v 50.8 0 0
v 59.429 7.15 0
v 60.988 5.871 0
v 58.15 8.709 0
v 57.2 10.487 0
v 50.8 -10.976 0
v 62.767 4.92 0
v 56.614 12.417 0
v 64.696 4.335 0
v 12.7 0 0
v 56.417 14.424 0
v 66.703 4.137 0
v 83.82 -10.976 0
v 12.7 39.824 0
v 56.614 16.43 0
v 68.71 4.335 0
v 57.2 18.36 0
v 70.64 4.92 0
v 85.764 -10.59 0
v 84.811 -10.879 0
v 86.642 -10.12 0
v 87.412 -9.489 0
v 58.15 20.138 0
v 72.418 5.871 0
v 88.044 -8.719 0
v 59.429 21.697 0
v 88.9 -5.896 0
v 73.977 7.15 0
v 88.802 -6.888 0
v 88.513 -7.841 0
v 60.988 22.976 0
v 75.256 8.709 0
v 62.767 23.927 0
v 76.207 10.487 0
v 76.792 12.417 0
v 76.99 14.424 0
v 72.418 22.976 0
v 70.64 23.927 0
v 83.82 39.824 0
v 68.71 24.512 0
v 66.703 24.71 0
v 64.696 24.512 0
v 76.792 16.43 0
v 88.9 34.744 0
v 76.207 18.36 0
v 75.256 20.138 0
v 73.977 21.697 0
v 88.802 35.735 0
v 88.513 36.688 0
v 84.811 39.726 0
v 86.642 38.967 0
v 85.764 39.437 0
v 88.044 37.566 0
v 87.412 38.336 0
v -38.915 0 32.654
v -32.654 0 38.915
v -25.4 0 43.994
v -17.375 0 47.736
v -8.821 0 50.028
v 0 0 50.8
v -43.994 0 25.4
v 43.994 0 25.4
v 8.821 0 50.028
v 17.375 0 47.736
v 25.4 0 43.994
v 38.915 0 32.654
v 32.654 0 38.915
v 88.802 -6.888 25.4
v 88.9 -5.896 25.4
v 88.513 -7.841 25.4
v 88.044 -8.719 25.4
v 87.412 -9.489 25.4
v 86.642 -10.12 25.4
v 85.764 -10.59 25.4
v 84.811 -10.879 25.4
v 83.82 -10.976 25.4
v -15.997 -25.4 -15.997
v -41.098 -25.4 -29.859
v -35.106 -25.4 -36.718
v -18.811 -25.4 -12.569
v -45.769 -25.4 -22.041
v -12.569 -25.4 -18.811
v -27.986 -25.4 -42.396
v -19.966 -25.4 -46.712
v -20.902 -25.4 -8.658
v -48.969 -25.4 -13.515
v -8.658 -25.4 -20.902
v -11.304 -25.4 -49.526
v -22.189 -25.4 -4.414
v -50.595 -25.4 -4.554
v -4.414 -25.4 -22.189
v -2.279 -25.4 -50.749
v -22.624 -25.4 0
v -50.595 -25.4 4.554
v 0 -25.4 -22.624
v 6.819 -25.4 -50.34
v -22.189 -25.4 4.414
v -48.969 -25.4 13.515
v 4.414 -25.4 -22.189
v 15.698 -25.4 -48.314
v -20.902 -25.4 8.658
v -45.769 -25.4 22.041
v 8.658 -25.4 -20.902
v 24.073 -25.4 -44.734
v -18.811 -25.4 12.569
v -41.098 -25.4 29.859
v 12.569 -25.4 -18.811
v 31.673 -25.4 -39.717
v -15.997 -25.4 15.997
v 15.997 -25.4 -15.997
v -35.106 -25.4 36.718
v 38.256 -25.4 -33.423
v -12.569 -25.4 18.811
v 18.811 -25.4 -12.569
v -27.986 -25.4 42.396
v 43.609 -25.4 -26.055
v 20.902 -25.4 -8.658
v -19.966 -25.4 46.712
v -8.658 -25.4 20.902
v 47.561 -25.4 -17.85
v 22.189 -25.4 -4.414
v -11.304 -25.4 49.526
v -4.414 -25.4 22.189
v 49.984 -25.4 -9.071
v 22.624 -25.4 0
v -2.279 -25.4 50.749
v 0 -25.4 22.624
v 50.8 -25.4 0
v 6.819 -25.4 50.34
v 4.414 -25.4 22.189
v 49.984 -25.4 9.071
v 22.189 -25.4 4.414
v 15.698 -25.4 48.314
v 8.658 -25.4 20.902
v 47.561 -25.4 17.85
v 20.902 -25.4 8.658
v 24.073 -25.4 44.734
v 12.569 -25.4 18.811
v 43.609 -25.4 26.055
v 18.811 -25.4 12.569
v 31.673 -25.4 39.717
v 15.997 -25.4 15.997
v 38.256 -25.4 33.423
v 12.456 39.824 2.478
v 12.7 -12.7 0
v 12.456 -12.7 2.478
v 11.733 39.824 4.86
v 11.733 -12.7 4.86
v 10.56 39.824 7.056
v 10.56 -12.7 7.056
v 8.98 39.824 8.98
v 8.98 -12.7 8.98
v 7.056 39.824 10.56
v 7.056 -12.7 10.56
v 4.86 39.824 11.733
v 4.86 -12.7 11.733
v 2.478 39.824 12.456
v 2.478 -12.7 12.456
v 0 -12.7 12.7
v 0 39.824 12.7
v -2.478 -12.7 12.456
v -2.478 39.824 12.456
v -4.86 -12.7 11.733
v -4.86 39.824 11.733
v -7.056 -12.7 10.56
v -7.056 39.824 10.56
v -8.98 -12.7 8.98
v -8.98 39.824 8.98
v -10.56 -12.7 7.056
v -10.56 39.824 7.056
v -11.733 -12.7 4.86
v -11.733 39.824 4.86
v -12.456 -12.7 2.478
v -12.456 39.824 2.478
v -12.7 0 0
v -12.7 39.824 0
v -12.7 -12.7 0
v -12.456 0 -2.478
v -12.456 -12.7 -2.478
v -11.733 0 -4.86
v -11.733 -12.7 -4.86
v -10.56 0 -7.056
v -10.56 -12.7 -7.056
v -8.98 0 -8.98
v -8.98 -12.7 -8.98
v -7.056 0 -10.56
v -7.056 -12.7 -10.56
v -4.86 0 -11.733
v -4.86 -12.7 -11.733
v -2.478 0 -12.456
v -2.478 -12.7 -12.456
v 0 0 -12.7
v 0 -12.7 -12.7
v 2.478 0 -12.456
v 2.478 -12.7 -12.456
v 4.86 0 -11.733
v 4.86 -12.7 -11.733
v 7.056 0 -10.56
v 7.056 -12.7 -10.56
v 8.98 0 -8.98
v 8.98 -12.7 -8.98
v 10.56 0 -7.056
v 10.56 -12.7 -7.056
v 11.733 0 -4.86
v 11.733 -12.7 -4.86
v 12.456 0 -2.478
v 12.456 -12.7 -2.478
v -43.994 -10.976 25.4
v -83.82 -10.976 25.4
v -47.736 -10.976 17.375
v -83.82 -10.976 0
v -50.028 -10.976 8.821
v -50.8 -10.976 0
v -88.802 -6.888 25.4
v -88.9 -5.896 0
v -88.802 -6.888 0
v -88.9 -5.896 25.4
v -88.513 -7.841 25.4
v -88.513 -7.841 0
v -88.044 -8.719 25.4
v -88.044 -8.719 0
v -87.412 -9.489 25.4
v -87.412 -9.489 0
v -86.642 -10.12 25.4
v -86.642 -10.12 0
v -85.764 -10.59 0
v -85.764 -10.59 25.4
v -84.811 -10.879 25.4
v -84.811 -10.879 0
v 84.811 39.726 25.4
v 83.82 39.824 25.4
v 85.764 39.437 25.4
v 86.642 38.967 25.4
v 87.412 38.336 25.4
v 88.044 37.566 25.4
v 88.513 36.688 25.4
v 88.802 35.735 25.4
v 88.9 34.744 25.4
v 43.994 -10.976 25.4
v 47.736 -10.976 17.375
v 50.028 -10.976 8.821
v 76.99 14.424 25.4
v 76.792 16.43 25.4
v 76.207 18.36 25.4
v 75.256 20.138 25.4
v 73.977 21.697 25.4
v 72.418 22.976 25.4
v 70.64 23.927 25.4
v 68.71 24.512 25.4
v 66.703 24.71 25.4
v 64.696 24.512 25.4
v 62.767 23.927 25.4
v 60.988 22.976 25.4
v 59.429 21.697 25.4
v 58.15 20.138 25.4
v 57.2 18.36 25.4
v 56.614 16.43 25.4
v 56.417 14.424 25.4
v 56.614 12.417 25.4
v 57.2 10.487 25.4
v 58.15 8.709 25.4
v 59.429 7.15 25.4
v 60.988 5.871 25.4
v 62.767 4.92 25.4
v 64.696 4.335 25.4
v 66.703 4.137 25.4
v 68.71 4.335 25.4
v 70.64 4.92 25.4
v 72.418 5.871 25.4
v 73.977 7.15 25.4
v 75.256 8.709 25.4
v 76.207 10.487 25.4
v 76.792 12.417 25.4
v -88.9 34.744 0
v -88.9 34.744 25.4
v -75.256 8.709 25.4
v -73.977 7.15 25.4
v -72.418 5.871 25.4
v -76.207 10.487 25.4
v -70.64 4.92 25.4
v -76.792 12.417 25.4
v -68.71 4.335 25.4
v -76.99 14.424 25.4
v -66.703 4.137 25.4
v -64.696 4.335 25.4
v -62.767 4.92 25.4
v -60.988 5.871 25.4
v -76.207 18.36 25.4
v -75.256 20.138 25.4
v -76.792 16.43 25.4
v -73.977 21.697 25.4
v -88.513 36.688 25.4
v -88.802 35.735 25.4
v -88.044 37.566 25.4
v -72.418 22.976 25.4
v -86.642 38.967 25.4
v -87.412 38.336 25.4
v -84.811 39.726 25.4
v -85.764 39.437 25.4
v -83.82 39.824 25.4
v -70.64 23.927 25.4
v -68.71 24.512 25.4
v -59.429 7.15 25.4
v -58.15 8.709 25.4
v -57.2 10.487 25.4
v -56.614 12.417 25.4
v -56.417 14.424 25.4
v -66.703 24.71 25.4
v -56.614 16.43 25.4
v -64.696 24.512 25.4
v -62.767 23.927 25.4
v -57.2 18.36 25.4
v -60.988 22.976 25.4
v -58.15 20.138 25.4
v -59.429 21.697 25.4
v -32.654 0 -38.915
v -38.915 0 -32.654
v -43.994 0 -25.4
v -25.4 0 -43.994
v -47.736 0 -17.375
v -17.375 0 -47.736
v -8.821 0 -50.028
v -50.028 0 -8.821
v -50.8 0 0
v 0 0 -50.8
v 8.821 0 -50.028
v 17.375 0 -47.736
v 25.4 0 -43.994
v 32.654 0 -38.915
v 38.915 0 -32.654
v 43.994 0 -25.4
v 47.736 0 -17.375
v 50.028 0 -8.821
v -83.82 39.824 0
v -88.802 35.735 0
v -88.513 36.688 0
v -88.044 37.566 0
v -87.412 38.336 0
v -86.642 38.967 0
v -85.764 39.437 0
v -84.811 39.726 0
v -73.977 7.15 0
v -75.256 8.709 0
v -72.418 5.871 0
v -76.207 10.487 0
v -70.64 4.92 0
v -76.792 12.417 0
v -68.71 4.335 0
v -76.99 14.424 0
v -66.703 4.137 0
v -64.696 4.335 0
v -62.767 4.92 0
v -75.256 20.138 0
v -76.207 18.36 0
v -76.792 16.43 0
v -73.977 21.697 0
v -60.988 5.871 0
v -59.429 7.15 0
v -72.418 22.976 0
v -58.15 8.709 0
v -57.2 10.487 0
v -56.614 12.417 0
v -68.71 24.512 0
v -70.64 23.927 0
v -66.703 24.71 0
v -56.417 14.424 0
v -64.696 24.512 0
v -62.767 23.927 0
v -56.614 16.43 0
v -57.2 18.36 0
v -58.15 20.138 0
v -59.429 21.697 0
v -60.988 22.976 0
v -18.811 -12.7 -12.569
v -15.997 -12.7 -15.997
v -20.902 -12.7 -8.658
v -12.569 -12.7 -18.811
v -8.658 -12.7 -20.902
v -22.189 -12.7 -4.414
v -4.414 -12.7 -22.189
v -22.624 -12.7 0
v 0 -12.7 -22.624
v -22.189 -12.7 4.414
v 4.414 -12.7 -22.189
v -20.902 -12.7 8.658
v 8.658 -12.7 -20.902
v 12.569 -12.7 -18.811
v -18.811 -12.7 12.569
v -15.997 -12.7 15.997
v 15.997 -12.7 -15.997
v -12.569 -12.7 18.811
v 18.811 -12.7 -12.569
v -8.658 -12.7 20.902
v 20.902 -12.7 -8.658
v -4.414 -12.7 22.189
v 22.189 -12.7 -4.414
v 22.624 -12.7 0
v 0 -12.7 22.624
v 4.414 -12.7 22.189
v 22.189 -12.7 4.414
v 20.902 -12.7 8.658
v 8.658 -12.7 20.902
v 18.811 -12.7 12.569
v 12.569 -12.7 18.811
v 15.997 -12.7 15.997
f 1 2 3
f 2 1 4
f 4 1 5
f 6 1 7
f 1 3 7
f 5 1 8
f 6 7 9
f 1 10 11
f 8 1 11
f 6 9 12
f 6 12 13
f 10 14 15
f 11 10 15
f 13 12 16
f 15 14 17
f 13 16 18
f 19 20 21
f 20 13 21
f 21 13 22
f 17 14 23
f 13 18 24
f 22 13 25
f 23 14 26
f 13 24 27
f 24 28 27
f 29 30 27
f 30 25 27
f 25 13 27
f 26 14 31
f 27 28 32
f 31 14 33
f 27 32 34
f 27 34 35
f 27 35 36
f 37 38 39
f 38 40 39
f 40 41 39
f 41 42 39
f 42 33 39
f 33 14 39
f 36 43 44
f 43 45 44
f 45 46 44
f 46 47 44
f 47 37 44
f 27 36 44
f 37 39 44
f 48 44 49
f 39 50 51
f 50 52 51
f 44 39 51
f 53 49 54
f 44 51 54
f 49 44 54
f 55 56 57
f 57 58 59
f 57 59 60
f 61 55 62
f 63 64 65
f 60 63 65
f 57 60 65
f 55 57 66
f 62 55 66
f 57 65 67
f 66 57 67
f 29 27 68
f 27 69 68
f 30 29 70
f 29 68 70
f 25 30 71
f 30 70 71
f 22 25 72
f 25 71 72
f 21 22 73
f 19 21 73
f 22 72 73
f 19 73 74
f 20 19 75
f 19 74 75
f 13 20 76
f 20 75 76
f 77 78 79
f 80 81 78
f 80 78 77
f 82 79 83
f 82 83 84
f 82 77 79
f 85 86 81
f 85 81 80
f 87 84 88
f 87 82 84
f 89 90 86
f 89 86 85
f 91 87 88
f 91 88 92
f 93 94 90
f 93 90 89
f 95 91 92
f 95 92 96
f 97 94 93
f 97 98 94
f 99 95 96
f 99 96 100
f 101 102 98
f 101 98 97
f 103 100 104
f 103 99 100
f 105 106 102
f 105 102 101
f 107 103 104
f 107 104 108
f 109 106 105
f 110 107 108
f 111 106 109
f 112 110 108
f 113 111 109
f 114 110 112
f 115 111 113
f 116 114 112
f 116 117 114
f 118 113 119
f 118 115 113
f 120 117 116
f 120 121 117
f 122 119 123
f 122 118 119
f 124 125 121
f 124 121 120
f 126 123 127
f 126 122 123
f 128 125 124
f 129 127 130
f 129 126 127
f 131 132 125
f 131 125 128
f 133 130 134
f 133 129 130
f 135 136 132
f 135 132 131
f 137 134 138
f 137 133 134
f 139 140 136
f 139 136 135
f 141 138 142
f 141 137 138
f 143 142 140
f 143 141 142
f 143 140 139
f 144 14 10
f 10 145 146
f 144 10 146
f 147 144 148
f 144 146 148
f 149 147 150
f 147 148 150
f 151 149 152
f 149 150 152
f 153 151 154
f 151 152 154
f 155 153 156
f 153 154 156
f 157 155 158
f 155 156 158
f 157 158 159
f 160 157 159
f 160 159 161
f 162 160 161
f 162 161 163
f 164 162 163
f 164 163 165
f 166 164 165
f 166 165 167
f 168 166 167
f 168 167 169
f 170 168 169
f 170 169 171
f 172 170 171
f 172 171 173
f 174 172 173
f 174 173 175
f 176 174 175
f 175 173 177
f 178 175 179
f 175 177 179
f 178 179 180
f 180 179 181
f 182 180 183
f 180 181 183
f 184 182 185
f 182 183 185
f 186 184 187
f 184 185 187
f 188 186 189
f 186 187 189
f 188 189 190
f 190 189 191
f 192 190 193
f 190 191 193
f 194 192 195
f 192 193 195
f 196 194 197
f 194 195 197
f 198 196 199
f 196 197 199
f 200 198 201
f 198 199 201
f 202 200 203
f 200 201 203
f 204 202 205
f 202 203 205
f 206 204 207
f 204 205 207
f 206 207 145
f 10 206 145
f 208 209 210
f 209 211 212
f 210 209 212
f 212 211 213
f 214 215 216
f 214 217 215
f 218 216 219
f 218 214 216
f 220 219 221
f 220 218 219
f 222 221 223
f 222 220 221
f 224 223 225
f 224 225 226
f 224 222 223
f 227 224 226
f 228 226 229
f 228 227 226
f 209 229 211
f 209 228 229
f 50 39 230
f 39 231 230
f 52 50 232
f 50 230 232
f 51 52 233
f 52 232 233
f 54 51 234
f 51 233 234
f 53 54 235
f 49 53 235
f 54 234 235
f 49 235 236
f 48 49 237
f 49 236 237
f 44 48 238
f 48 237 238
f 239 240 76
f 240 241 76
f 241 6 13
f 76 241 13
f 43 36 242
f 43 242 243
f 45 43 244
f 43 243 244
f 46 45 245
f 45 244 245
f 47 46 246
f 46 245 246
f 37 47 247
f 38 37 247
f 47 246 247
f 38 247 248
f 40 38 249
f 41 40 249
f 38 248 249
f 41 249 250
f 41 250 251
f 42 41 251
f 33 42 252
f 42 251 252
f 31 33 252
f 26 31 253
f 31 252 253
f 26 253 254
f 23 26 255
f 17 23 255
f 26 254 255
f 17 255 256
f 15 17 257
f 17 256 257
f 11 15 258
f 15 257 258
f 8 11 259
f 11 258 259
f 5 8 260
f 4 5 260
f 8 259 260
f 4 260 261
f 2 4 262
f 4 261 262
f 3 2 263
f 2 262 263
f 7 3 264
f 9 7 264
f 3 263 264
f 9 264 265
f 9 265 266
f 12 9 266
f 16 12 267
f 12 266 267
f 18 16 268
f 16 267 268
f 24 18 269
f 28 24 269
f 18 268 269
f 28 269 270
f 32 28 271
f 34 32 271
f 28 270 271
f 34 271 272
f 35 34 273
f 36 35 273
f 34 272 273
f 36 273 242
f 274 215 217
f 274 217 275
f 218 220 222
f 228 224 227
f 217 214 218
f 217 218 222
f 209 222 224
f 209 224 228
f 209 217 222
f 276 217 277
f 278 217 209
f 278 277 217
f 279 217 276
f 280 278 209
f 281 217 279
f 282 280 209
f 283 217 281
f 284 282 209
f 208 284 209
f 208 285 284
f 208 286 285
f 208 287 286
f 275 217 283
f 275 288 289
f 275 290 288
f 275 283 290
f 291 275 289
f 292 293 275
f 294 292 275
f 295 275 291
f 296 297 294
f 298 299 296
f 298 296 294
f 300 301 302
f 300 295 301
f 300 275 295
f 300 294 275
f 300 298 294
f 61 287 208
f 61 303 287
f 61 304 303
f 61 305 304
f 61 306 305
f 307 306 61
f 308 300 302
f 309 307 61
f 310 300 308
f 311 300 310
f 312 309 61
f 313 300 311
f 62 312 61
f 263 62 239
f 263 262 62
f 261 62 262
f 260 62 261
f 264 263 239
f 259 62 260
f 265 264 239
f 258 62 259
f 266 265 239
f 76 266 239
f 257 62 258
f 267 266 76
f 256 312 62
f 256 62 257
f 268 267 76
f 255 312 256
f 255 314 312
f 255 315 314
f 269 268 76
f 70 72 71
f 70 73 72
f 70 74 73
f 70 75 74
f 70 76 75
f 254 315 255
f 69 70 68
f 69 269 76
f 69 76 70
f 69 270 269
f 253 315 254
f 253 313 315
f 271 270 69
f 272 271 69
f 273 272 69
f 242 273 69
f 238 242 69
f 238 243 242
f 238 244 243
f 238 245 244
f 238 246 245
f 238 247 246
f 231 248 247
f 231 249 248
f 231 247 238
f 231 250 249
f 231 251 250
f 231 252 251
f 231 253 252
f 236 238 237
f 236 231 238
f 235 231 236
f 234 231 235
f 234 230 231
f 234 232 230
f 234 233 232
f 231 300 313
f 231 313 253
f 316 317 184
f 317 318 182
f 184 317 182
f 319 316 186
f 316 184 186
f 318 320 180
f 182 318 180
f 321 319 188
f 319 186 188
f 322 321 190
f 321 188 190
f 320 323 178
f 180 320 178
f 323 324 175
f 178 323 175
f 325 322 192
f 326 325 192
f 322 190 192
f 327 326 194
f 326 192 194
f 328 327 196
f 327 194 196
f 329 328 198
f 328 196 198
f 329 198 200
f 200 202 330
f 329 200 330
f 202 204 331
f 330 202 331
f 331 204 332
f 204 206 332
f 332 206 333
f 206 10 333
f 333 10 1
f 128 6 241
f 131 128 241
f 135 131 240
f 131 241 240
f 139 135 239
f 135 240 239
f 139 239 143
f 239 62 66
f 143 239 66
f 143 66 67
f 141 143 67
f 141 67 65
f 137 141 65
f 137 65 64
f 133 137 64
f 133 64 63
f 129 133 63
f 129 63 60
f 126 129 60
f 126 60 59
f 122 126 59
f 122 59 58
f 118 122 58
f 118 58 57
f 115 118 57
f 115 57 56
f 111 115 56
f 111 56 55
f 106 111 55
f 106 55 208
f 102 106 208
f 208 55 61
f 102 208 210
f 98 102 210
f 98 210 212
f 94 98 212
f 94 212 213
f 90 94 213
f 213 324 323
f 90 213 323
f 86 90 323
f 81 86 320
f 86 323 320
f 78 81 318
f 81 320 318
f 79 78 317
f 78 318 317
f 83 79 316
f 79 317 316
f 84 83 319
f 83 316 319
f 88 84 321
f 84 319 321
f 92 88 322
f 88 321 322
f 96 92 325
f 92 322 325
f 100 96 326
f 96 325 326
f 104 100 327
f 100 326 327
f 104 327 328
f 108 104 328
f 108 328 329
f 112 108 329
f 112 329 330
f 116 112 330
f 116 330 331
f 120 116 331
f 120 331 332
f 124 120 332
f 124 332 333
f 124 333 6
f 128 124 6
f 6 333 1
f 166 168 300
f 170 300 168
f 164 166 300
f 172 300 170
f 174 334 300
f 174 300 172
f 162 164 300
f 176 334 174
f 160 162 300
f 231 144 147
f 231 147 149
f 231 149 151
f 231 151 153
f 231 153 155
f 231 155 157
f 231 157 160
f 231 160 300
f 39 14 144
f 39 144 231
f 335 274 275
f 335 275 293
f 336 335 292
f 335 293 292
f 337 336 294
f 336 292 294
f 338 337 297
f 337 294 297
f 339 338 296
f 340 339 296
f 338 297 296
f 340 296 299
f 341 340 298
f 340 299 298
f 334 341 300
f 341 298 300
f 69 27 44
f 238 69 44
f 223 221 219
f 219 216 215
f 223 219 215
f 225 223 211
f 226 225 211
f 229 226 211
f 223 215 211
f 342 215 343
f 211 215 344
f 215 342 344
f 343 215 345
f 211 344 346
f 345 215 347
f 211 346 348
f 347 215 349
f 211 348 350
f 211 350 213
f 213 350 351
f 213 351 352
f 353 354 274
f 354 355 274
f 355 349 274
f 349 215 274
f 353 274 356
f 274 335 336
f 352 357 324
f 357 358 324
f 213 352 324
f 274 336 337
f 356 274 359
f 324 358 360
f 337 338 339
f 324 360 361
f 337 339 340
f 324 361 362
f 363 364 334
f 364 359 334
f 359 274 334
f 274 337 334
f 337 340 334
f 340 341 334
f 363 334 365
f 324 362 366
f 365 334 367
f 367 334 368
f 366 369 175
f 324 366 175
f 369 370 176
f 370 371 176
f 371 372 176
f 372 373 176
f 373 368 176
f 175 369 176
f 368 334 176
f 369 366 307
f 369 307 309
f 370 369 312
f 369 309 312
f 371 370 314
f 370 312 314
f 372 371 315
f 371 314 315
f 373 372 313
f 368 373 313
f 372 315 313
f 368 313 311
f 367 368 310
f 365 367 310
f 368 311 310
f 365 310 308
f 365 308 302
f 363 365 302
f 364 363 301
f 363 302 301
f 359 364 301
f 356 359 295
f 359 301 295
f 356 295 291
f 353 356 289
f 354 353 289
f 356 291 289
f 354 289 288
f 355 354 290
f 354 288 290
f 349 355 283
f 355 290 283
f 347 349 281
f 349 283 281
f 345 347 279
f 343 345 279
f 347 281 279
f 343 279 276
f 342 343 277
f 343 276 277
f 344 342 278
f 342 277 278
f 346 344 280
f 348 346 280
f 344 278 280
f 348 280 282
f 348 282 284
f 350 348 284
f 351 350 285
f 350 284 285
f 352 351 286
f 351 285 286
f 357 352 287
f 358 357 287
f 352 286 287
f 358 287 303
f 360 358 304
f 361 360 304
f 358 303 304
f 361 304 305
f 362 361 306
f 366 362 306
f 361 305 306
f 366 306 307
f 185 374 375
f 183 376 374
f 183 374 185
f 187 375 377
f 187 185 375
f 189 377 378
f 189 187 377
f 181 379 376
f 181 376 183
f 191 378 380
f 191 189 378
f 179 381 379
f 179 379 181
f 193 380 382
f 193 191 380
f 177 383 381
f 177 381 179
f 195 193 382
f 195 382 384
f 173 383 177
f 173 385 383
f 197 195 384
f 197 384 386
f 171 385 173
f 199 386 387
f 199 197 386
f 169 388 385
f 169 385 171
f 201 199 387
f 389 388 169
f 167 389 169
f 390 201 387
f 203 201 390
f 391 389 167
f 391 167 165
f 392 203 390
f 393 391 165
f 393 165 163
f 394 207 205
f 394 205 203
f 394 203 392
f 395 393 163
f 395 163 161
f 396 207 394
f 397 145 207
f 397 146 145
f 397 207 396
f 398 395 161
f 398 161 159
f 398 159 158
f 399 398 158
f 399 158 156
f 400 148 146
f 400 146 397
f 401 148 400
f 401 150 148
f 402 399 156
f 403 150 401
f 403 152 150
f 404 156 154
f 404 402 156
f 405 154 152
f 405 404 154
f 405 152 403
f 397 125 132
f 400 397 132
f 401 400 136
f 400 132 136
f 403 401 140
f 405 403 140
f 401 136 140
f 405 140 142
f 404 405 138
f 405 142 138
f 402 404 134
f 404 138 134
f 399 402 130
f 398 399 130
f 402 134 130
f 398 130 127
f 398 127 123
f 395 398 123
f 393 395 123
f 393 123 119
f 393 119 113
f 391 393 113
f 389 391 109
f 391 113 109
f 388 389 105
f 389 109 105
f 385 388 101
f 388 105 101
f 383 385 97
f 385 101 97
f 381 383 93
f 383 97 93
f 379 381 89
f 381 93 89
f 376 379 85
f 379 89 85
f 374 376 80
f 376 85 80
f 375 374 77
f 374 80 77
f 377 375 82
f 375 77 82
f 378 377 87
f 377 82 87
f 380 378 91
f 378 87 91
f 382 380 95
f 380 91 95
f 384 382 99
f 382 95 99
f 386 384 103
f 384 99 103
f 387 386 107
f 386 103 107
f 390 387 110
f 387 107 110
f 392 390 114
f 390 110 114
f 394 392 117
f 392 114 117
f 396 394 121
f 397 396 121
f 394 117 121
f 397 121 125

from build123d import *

# Parameters (mm, degrees)
F0_R      = 50.8
F0_R_2    = 12.7
F1_DEPTH  = 25.4
F2_W      = 177.8
F2_H      = 50.8
F3_DEPTH  = 25.4
F5_R      = 22.6237609961
F6_DEPTH  = 12.7
F7_R      = 10.2865280917
F8_DEPTH  = 25.4
F9_R      = 5.08
F11_R     = 12.7
F12_DEPTH = 76.2


# Not quite as in the source:
# - a feature names something its author has since deleted; it is built from what else it names


with BuildPart() as f1:
    # F0 (on Front) → F1 (new body)
    with BuildSketch(Plane.XZ):
        Circle(F0_R)
        Circle(F0_R_2, mode=Mode.SUBTRACT)
    extrude(amount=F1_DEPTH)

    # F2 (on Top) → F3 (join)
    with BuildSketch(Plane.XY):
        with Locations((0, 14.4235261992)):
            Rectangle(F2_W, F2_H)
    extrude(amount=F3_DEPTH)

    # F4: union 

    # F5 (on face) → F6 (cut)
    with BuildSketch(Plane.XZ.offset(25.4)):
        Circle(F5_R)
    extrude(amount=-F6_DEPTH, mode=Mode.SUBTRACT)

    # F7 (on face) → F8 (cut)
    with BuildSketch(Plane.XY.offset(25.4)):
        with Locations((-66.7031380003, 14.4235261992)):
            Circle(F7_R)
        with Locations((66.7031380003, 14.4235261992)):
            Circle(F7_R)
    extrude(amount=-F8_DEPTH, mode=Mode.SUBTRACT)

    # F9
    f9_edges = [f1.edges().sort_by_distance(p)[0] for p in [
        (88.9, 39.823526, 12.7),
        (-88.9, 39.823526, 12.7),
        (-88.9, -10.976474, 12.7),
        (88.9, -10.976474, 12.7),
    ]]
    fillet(f9_edges, radius=F9_R)

    # F11 (on face) → F12 (cut)
    with BuildSketch(Plane.XZ.offset(25.4)):
        Circle(F11_R)
    extrude(amount=-F12_DEPTH, mode=Mode.SUBTRACT)


solid = f1.part
